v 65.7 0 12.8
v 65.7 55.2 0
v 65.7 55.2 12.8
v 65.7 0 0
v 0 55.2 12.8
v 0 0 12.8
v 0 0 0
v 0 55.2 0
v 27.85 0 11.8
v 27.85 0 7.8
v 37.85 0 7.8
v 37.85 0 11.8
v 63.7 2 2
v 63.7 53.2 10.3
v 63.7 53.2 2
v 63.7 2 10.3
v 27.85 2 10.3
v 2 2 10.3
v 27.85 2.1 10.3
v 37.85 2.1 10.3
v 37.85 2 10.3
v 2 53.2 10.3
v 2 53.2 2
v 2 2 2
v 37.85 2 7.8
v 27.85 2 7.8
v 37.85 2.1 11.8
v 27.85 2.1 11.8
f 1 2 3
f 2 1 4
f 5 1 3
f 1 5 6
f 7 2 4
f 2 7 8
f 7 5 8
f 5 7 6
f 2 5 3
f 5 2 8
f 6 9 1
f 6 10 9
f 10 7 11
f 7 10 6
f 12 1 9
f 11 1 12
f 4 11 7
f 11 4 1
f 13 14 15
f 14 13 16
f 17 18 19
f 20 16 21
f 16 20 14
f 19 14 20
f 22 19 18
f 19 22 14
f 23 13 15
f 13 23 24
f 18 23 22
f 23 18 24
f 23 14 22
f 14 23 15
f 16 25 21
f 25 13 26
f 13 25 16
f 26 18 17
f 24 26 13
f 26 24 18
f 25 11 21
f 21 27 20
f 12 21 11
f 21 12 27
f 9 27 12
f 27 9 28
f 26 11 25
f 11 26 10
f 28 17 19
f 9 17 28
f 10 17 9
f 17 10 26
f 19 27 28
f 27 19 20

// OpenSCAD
// PKCell LP-785060-J LiPo holder
// Battery size: 60.5 x 50 x 7.8 mm

battery_x = 60.5;
battery_y = 50;
battery_z = 7.8;

clearance = 0.6;
wall = 2.0;
floor = 2.0;

holder_x = battery_x + clearance*2 + wall*2;
holder_y = battery_y + clearance*2 + wall*2;
holder_z = battery_z + floor + 3;

difference() {

    // Outer shell
    cube([holder_x, holder_y, holder_z], center=false);

    // Battery cavity
    translate([wall, wall, floor])
        cube([
            battery_x + clearance*2,
            battery_y + clearance*2,
            battery_z + 0.5
        ], center=false);

    // Cable exit notch
    translate([
        holder_x/2 - 5,
        -0.1,
        floor + battery_z - 2
    ])
    cube([10, wall + 0.2, 4], center=false);
}
